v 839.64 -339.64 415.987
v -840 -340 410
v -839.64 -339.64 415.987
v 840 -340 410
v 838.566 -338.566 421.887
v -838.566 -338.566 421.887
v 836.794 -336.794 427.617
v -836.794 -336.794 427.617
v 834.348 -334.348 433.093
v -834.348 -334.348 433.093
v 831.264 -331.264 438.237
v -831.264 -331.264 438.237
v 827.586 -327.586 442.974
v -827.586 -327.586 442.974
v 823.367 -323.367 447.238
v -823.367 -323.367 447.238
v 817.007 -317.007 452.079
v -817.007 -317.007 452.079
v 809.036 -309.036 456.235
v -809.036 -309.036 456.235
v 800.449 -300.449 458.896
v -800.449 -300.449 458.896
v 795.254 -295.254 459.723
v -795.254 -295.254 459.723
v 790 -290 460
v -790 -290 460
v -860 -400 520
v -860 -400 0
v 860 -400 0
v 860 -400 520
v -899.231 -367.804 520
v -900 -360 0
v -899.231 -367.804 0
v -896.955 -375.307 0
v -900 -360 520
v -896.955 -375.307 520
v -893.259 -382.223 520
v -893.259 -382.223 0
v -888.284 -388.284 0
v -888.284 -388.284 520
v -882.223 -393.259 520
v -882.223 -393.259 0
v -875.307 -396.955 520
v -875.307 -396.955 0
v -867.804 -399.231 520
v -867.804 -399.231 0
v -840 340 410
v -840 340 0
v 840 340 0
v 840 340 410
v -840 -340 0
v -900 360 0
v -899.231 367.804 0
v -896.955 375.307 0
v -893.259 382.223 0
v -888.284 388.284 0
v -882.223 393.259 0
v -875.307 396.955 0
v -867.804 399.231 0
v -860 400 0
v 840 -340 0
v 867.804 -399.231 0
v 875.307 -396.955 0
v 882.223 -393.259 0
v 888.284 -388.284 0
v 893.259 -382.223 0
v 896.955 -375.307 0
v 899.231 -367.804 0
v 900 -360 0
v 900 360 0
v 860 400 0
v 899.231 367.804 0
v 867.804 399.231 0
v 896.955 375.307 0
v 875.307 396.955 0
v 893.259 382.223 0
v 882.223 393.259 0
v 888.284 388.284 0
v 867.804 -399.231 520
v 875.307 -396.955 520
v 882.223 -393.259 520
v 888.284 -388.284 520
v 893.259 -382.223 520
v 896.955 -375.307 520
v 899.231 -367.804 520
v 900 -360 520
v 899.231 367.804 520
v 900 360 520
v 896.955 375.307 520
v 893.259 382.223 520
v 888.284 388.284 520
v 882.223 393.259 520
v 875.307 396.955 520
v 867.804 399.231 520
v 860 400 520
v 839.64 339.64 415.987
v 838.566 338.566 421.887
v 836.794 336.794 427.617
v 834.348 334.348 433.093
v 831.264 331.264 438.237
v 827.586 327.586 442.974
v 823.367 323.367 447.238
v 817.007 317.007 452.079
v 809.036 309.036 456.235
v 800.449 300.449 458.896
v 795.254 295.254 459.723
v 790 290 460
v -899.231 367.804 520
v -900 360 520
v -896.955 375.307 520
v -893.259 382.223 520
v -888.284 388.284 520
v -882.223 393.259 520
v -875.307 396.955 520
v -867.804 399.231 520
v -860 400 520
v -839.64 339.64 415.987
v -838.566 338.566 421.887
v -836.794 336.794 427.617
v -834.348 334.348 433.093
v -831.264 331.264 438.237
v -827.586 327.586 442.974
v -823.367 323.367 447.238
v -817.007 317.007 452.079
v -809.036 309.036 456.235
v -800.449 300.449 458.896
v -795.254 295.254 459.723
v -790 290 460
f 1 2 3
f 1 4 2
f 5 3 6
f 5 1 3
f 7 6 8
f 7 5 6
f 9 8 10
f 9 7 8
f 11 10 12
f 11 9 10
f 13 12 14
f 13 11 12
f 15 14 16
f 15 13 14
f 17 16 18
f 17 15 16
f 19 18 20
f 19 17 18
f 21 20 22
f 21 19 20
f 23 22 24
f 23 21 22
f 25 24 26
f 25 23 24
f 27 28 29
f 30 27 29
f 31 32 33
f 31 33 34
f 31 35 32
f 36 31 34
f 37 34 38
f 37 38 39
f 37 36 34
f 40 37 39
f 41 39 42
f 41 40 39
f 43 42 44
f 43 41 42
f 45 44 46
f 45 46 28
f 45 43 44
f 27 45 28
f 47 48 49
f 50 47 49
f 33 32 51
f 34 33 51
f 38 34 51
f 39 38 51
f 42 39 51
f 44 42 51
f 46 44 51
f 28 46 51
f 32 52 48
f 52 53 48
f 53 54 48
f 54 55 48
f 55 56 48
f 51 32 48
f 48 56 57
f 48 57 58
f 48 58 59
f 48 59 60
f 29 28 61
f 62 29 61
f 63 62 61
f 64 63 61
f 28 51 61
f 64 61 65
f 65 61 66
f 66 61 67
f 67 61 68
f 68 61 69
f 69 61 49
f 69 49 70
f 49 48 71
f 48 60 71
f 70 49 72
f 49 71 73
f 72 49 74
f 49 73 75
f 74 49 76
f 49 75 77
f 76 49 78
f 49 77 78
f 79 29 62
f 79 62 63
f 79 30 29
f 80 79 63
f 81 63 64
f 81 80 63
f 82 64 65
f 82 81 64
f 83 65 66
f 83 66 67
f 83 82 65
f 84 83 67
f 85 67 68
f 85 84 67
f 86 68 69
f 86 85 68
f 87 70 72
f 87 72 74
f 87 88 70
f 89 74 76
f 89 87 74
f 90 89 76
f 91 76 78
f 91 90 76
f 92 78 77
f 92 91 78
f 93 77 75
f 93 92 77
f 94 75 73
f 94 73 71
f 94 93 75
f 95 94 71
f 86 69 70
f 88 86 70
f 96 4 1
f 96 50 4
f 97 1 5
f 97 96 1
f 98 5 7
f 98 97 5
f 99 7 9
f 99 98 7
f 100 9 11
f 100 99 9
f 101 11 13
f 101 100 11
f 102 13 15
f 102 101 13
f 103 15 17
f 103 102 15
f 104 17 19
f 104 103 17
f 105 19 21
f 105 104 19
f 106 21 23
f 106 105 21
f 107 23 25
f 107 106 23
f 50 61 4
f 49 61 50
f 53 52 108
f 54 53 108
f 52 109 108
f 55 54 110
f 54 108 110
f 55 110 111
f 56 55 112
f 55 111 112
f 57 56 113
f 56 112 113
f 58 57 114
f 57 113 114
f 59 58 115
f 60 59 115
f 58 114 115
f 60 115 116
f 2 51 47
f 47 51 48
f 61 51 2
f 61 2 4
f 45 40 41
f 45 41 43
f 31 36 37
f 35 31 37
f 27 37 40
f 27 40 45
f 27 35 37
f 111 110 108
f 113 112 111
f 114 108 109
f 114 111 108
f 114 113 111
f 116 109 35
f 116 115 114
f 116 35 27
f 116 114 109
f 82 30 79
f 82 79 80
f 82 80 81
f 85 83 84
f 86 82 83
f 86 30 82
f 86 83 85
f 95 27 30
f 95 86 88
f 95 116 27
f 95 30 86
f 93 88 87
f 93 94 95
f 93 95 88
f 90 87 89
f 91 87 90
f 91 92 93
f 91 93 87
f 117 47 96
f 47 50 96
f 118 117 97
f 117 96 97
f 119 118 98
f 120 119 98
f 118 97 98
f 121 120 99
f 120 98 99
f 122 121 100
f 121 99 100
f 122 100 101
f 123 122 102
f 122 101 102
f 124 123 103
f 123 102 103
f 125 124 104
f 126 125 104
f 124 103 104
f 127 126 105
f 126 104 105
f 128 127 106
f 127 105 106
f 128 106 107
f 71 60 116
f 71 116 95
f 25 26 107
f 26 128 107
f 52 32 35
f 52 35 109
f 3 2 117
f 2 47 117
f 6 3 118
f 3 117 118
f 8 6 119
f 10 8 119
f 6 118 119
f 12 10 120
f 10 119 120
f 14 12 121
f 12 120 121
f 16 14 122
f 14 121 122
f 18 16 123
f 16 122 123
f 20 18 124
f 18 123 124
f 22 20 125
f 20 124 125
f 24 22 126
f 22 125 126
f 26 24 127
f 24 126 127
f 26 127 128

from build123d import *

# Parameters (mm, degrees)
F0_W     = 1800
F0_H     = 800
F1_DEPTH = 520
F2_T     = -60
F3_R     = 50
F4_R     = 40


with BuildPart() as f1:
    # F0 (on Top) → F1 (new body)
    with BuildSketch(Plane.XY):
        Rectangle(F0_W, F0_H)
    extrude(amount=F1_DEPTH)

    # F2
    f2_openings = [f1.faces().sort_by_distance(p)[0] for p in [
        (0, 0, 0),
    ]]
    offset(amount=F2_T, openings=f2_openings)

    # F3
    f3_edges = [f1.edges().sort_by_distance(p)[0] for p in [
        (0, -340, 460),
        (840, 0, 460),
        (0, 340, 460),
        (-840, 0, 460),
    ]]
    fillet(f3_edges, radius=F3_R)

    # F4
    f4_edges = [f1.edges().sort_by_distance(p)[0] for p in [
        (900, 400, 260),
        (900, -400, 260),
        (-900, -400, 260),
        (-900, 400, 260),
    ]]
    fillet(f4_edges, radius=F4_R)


solid = f1.part
